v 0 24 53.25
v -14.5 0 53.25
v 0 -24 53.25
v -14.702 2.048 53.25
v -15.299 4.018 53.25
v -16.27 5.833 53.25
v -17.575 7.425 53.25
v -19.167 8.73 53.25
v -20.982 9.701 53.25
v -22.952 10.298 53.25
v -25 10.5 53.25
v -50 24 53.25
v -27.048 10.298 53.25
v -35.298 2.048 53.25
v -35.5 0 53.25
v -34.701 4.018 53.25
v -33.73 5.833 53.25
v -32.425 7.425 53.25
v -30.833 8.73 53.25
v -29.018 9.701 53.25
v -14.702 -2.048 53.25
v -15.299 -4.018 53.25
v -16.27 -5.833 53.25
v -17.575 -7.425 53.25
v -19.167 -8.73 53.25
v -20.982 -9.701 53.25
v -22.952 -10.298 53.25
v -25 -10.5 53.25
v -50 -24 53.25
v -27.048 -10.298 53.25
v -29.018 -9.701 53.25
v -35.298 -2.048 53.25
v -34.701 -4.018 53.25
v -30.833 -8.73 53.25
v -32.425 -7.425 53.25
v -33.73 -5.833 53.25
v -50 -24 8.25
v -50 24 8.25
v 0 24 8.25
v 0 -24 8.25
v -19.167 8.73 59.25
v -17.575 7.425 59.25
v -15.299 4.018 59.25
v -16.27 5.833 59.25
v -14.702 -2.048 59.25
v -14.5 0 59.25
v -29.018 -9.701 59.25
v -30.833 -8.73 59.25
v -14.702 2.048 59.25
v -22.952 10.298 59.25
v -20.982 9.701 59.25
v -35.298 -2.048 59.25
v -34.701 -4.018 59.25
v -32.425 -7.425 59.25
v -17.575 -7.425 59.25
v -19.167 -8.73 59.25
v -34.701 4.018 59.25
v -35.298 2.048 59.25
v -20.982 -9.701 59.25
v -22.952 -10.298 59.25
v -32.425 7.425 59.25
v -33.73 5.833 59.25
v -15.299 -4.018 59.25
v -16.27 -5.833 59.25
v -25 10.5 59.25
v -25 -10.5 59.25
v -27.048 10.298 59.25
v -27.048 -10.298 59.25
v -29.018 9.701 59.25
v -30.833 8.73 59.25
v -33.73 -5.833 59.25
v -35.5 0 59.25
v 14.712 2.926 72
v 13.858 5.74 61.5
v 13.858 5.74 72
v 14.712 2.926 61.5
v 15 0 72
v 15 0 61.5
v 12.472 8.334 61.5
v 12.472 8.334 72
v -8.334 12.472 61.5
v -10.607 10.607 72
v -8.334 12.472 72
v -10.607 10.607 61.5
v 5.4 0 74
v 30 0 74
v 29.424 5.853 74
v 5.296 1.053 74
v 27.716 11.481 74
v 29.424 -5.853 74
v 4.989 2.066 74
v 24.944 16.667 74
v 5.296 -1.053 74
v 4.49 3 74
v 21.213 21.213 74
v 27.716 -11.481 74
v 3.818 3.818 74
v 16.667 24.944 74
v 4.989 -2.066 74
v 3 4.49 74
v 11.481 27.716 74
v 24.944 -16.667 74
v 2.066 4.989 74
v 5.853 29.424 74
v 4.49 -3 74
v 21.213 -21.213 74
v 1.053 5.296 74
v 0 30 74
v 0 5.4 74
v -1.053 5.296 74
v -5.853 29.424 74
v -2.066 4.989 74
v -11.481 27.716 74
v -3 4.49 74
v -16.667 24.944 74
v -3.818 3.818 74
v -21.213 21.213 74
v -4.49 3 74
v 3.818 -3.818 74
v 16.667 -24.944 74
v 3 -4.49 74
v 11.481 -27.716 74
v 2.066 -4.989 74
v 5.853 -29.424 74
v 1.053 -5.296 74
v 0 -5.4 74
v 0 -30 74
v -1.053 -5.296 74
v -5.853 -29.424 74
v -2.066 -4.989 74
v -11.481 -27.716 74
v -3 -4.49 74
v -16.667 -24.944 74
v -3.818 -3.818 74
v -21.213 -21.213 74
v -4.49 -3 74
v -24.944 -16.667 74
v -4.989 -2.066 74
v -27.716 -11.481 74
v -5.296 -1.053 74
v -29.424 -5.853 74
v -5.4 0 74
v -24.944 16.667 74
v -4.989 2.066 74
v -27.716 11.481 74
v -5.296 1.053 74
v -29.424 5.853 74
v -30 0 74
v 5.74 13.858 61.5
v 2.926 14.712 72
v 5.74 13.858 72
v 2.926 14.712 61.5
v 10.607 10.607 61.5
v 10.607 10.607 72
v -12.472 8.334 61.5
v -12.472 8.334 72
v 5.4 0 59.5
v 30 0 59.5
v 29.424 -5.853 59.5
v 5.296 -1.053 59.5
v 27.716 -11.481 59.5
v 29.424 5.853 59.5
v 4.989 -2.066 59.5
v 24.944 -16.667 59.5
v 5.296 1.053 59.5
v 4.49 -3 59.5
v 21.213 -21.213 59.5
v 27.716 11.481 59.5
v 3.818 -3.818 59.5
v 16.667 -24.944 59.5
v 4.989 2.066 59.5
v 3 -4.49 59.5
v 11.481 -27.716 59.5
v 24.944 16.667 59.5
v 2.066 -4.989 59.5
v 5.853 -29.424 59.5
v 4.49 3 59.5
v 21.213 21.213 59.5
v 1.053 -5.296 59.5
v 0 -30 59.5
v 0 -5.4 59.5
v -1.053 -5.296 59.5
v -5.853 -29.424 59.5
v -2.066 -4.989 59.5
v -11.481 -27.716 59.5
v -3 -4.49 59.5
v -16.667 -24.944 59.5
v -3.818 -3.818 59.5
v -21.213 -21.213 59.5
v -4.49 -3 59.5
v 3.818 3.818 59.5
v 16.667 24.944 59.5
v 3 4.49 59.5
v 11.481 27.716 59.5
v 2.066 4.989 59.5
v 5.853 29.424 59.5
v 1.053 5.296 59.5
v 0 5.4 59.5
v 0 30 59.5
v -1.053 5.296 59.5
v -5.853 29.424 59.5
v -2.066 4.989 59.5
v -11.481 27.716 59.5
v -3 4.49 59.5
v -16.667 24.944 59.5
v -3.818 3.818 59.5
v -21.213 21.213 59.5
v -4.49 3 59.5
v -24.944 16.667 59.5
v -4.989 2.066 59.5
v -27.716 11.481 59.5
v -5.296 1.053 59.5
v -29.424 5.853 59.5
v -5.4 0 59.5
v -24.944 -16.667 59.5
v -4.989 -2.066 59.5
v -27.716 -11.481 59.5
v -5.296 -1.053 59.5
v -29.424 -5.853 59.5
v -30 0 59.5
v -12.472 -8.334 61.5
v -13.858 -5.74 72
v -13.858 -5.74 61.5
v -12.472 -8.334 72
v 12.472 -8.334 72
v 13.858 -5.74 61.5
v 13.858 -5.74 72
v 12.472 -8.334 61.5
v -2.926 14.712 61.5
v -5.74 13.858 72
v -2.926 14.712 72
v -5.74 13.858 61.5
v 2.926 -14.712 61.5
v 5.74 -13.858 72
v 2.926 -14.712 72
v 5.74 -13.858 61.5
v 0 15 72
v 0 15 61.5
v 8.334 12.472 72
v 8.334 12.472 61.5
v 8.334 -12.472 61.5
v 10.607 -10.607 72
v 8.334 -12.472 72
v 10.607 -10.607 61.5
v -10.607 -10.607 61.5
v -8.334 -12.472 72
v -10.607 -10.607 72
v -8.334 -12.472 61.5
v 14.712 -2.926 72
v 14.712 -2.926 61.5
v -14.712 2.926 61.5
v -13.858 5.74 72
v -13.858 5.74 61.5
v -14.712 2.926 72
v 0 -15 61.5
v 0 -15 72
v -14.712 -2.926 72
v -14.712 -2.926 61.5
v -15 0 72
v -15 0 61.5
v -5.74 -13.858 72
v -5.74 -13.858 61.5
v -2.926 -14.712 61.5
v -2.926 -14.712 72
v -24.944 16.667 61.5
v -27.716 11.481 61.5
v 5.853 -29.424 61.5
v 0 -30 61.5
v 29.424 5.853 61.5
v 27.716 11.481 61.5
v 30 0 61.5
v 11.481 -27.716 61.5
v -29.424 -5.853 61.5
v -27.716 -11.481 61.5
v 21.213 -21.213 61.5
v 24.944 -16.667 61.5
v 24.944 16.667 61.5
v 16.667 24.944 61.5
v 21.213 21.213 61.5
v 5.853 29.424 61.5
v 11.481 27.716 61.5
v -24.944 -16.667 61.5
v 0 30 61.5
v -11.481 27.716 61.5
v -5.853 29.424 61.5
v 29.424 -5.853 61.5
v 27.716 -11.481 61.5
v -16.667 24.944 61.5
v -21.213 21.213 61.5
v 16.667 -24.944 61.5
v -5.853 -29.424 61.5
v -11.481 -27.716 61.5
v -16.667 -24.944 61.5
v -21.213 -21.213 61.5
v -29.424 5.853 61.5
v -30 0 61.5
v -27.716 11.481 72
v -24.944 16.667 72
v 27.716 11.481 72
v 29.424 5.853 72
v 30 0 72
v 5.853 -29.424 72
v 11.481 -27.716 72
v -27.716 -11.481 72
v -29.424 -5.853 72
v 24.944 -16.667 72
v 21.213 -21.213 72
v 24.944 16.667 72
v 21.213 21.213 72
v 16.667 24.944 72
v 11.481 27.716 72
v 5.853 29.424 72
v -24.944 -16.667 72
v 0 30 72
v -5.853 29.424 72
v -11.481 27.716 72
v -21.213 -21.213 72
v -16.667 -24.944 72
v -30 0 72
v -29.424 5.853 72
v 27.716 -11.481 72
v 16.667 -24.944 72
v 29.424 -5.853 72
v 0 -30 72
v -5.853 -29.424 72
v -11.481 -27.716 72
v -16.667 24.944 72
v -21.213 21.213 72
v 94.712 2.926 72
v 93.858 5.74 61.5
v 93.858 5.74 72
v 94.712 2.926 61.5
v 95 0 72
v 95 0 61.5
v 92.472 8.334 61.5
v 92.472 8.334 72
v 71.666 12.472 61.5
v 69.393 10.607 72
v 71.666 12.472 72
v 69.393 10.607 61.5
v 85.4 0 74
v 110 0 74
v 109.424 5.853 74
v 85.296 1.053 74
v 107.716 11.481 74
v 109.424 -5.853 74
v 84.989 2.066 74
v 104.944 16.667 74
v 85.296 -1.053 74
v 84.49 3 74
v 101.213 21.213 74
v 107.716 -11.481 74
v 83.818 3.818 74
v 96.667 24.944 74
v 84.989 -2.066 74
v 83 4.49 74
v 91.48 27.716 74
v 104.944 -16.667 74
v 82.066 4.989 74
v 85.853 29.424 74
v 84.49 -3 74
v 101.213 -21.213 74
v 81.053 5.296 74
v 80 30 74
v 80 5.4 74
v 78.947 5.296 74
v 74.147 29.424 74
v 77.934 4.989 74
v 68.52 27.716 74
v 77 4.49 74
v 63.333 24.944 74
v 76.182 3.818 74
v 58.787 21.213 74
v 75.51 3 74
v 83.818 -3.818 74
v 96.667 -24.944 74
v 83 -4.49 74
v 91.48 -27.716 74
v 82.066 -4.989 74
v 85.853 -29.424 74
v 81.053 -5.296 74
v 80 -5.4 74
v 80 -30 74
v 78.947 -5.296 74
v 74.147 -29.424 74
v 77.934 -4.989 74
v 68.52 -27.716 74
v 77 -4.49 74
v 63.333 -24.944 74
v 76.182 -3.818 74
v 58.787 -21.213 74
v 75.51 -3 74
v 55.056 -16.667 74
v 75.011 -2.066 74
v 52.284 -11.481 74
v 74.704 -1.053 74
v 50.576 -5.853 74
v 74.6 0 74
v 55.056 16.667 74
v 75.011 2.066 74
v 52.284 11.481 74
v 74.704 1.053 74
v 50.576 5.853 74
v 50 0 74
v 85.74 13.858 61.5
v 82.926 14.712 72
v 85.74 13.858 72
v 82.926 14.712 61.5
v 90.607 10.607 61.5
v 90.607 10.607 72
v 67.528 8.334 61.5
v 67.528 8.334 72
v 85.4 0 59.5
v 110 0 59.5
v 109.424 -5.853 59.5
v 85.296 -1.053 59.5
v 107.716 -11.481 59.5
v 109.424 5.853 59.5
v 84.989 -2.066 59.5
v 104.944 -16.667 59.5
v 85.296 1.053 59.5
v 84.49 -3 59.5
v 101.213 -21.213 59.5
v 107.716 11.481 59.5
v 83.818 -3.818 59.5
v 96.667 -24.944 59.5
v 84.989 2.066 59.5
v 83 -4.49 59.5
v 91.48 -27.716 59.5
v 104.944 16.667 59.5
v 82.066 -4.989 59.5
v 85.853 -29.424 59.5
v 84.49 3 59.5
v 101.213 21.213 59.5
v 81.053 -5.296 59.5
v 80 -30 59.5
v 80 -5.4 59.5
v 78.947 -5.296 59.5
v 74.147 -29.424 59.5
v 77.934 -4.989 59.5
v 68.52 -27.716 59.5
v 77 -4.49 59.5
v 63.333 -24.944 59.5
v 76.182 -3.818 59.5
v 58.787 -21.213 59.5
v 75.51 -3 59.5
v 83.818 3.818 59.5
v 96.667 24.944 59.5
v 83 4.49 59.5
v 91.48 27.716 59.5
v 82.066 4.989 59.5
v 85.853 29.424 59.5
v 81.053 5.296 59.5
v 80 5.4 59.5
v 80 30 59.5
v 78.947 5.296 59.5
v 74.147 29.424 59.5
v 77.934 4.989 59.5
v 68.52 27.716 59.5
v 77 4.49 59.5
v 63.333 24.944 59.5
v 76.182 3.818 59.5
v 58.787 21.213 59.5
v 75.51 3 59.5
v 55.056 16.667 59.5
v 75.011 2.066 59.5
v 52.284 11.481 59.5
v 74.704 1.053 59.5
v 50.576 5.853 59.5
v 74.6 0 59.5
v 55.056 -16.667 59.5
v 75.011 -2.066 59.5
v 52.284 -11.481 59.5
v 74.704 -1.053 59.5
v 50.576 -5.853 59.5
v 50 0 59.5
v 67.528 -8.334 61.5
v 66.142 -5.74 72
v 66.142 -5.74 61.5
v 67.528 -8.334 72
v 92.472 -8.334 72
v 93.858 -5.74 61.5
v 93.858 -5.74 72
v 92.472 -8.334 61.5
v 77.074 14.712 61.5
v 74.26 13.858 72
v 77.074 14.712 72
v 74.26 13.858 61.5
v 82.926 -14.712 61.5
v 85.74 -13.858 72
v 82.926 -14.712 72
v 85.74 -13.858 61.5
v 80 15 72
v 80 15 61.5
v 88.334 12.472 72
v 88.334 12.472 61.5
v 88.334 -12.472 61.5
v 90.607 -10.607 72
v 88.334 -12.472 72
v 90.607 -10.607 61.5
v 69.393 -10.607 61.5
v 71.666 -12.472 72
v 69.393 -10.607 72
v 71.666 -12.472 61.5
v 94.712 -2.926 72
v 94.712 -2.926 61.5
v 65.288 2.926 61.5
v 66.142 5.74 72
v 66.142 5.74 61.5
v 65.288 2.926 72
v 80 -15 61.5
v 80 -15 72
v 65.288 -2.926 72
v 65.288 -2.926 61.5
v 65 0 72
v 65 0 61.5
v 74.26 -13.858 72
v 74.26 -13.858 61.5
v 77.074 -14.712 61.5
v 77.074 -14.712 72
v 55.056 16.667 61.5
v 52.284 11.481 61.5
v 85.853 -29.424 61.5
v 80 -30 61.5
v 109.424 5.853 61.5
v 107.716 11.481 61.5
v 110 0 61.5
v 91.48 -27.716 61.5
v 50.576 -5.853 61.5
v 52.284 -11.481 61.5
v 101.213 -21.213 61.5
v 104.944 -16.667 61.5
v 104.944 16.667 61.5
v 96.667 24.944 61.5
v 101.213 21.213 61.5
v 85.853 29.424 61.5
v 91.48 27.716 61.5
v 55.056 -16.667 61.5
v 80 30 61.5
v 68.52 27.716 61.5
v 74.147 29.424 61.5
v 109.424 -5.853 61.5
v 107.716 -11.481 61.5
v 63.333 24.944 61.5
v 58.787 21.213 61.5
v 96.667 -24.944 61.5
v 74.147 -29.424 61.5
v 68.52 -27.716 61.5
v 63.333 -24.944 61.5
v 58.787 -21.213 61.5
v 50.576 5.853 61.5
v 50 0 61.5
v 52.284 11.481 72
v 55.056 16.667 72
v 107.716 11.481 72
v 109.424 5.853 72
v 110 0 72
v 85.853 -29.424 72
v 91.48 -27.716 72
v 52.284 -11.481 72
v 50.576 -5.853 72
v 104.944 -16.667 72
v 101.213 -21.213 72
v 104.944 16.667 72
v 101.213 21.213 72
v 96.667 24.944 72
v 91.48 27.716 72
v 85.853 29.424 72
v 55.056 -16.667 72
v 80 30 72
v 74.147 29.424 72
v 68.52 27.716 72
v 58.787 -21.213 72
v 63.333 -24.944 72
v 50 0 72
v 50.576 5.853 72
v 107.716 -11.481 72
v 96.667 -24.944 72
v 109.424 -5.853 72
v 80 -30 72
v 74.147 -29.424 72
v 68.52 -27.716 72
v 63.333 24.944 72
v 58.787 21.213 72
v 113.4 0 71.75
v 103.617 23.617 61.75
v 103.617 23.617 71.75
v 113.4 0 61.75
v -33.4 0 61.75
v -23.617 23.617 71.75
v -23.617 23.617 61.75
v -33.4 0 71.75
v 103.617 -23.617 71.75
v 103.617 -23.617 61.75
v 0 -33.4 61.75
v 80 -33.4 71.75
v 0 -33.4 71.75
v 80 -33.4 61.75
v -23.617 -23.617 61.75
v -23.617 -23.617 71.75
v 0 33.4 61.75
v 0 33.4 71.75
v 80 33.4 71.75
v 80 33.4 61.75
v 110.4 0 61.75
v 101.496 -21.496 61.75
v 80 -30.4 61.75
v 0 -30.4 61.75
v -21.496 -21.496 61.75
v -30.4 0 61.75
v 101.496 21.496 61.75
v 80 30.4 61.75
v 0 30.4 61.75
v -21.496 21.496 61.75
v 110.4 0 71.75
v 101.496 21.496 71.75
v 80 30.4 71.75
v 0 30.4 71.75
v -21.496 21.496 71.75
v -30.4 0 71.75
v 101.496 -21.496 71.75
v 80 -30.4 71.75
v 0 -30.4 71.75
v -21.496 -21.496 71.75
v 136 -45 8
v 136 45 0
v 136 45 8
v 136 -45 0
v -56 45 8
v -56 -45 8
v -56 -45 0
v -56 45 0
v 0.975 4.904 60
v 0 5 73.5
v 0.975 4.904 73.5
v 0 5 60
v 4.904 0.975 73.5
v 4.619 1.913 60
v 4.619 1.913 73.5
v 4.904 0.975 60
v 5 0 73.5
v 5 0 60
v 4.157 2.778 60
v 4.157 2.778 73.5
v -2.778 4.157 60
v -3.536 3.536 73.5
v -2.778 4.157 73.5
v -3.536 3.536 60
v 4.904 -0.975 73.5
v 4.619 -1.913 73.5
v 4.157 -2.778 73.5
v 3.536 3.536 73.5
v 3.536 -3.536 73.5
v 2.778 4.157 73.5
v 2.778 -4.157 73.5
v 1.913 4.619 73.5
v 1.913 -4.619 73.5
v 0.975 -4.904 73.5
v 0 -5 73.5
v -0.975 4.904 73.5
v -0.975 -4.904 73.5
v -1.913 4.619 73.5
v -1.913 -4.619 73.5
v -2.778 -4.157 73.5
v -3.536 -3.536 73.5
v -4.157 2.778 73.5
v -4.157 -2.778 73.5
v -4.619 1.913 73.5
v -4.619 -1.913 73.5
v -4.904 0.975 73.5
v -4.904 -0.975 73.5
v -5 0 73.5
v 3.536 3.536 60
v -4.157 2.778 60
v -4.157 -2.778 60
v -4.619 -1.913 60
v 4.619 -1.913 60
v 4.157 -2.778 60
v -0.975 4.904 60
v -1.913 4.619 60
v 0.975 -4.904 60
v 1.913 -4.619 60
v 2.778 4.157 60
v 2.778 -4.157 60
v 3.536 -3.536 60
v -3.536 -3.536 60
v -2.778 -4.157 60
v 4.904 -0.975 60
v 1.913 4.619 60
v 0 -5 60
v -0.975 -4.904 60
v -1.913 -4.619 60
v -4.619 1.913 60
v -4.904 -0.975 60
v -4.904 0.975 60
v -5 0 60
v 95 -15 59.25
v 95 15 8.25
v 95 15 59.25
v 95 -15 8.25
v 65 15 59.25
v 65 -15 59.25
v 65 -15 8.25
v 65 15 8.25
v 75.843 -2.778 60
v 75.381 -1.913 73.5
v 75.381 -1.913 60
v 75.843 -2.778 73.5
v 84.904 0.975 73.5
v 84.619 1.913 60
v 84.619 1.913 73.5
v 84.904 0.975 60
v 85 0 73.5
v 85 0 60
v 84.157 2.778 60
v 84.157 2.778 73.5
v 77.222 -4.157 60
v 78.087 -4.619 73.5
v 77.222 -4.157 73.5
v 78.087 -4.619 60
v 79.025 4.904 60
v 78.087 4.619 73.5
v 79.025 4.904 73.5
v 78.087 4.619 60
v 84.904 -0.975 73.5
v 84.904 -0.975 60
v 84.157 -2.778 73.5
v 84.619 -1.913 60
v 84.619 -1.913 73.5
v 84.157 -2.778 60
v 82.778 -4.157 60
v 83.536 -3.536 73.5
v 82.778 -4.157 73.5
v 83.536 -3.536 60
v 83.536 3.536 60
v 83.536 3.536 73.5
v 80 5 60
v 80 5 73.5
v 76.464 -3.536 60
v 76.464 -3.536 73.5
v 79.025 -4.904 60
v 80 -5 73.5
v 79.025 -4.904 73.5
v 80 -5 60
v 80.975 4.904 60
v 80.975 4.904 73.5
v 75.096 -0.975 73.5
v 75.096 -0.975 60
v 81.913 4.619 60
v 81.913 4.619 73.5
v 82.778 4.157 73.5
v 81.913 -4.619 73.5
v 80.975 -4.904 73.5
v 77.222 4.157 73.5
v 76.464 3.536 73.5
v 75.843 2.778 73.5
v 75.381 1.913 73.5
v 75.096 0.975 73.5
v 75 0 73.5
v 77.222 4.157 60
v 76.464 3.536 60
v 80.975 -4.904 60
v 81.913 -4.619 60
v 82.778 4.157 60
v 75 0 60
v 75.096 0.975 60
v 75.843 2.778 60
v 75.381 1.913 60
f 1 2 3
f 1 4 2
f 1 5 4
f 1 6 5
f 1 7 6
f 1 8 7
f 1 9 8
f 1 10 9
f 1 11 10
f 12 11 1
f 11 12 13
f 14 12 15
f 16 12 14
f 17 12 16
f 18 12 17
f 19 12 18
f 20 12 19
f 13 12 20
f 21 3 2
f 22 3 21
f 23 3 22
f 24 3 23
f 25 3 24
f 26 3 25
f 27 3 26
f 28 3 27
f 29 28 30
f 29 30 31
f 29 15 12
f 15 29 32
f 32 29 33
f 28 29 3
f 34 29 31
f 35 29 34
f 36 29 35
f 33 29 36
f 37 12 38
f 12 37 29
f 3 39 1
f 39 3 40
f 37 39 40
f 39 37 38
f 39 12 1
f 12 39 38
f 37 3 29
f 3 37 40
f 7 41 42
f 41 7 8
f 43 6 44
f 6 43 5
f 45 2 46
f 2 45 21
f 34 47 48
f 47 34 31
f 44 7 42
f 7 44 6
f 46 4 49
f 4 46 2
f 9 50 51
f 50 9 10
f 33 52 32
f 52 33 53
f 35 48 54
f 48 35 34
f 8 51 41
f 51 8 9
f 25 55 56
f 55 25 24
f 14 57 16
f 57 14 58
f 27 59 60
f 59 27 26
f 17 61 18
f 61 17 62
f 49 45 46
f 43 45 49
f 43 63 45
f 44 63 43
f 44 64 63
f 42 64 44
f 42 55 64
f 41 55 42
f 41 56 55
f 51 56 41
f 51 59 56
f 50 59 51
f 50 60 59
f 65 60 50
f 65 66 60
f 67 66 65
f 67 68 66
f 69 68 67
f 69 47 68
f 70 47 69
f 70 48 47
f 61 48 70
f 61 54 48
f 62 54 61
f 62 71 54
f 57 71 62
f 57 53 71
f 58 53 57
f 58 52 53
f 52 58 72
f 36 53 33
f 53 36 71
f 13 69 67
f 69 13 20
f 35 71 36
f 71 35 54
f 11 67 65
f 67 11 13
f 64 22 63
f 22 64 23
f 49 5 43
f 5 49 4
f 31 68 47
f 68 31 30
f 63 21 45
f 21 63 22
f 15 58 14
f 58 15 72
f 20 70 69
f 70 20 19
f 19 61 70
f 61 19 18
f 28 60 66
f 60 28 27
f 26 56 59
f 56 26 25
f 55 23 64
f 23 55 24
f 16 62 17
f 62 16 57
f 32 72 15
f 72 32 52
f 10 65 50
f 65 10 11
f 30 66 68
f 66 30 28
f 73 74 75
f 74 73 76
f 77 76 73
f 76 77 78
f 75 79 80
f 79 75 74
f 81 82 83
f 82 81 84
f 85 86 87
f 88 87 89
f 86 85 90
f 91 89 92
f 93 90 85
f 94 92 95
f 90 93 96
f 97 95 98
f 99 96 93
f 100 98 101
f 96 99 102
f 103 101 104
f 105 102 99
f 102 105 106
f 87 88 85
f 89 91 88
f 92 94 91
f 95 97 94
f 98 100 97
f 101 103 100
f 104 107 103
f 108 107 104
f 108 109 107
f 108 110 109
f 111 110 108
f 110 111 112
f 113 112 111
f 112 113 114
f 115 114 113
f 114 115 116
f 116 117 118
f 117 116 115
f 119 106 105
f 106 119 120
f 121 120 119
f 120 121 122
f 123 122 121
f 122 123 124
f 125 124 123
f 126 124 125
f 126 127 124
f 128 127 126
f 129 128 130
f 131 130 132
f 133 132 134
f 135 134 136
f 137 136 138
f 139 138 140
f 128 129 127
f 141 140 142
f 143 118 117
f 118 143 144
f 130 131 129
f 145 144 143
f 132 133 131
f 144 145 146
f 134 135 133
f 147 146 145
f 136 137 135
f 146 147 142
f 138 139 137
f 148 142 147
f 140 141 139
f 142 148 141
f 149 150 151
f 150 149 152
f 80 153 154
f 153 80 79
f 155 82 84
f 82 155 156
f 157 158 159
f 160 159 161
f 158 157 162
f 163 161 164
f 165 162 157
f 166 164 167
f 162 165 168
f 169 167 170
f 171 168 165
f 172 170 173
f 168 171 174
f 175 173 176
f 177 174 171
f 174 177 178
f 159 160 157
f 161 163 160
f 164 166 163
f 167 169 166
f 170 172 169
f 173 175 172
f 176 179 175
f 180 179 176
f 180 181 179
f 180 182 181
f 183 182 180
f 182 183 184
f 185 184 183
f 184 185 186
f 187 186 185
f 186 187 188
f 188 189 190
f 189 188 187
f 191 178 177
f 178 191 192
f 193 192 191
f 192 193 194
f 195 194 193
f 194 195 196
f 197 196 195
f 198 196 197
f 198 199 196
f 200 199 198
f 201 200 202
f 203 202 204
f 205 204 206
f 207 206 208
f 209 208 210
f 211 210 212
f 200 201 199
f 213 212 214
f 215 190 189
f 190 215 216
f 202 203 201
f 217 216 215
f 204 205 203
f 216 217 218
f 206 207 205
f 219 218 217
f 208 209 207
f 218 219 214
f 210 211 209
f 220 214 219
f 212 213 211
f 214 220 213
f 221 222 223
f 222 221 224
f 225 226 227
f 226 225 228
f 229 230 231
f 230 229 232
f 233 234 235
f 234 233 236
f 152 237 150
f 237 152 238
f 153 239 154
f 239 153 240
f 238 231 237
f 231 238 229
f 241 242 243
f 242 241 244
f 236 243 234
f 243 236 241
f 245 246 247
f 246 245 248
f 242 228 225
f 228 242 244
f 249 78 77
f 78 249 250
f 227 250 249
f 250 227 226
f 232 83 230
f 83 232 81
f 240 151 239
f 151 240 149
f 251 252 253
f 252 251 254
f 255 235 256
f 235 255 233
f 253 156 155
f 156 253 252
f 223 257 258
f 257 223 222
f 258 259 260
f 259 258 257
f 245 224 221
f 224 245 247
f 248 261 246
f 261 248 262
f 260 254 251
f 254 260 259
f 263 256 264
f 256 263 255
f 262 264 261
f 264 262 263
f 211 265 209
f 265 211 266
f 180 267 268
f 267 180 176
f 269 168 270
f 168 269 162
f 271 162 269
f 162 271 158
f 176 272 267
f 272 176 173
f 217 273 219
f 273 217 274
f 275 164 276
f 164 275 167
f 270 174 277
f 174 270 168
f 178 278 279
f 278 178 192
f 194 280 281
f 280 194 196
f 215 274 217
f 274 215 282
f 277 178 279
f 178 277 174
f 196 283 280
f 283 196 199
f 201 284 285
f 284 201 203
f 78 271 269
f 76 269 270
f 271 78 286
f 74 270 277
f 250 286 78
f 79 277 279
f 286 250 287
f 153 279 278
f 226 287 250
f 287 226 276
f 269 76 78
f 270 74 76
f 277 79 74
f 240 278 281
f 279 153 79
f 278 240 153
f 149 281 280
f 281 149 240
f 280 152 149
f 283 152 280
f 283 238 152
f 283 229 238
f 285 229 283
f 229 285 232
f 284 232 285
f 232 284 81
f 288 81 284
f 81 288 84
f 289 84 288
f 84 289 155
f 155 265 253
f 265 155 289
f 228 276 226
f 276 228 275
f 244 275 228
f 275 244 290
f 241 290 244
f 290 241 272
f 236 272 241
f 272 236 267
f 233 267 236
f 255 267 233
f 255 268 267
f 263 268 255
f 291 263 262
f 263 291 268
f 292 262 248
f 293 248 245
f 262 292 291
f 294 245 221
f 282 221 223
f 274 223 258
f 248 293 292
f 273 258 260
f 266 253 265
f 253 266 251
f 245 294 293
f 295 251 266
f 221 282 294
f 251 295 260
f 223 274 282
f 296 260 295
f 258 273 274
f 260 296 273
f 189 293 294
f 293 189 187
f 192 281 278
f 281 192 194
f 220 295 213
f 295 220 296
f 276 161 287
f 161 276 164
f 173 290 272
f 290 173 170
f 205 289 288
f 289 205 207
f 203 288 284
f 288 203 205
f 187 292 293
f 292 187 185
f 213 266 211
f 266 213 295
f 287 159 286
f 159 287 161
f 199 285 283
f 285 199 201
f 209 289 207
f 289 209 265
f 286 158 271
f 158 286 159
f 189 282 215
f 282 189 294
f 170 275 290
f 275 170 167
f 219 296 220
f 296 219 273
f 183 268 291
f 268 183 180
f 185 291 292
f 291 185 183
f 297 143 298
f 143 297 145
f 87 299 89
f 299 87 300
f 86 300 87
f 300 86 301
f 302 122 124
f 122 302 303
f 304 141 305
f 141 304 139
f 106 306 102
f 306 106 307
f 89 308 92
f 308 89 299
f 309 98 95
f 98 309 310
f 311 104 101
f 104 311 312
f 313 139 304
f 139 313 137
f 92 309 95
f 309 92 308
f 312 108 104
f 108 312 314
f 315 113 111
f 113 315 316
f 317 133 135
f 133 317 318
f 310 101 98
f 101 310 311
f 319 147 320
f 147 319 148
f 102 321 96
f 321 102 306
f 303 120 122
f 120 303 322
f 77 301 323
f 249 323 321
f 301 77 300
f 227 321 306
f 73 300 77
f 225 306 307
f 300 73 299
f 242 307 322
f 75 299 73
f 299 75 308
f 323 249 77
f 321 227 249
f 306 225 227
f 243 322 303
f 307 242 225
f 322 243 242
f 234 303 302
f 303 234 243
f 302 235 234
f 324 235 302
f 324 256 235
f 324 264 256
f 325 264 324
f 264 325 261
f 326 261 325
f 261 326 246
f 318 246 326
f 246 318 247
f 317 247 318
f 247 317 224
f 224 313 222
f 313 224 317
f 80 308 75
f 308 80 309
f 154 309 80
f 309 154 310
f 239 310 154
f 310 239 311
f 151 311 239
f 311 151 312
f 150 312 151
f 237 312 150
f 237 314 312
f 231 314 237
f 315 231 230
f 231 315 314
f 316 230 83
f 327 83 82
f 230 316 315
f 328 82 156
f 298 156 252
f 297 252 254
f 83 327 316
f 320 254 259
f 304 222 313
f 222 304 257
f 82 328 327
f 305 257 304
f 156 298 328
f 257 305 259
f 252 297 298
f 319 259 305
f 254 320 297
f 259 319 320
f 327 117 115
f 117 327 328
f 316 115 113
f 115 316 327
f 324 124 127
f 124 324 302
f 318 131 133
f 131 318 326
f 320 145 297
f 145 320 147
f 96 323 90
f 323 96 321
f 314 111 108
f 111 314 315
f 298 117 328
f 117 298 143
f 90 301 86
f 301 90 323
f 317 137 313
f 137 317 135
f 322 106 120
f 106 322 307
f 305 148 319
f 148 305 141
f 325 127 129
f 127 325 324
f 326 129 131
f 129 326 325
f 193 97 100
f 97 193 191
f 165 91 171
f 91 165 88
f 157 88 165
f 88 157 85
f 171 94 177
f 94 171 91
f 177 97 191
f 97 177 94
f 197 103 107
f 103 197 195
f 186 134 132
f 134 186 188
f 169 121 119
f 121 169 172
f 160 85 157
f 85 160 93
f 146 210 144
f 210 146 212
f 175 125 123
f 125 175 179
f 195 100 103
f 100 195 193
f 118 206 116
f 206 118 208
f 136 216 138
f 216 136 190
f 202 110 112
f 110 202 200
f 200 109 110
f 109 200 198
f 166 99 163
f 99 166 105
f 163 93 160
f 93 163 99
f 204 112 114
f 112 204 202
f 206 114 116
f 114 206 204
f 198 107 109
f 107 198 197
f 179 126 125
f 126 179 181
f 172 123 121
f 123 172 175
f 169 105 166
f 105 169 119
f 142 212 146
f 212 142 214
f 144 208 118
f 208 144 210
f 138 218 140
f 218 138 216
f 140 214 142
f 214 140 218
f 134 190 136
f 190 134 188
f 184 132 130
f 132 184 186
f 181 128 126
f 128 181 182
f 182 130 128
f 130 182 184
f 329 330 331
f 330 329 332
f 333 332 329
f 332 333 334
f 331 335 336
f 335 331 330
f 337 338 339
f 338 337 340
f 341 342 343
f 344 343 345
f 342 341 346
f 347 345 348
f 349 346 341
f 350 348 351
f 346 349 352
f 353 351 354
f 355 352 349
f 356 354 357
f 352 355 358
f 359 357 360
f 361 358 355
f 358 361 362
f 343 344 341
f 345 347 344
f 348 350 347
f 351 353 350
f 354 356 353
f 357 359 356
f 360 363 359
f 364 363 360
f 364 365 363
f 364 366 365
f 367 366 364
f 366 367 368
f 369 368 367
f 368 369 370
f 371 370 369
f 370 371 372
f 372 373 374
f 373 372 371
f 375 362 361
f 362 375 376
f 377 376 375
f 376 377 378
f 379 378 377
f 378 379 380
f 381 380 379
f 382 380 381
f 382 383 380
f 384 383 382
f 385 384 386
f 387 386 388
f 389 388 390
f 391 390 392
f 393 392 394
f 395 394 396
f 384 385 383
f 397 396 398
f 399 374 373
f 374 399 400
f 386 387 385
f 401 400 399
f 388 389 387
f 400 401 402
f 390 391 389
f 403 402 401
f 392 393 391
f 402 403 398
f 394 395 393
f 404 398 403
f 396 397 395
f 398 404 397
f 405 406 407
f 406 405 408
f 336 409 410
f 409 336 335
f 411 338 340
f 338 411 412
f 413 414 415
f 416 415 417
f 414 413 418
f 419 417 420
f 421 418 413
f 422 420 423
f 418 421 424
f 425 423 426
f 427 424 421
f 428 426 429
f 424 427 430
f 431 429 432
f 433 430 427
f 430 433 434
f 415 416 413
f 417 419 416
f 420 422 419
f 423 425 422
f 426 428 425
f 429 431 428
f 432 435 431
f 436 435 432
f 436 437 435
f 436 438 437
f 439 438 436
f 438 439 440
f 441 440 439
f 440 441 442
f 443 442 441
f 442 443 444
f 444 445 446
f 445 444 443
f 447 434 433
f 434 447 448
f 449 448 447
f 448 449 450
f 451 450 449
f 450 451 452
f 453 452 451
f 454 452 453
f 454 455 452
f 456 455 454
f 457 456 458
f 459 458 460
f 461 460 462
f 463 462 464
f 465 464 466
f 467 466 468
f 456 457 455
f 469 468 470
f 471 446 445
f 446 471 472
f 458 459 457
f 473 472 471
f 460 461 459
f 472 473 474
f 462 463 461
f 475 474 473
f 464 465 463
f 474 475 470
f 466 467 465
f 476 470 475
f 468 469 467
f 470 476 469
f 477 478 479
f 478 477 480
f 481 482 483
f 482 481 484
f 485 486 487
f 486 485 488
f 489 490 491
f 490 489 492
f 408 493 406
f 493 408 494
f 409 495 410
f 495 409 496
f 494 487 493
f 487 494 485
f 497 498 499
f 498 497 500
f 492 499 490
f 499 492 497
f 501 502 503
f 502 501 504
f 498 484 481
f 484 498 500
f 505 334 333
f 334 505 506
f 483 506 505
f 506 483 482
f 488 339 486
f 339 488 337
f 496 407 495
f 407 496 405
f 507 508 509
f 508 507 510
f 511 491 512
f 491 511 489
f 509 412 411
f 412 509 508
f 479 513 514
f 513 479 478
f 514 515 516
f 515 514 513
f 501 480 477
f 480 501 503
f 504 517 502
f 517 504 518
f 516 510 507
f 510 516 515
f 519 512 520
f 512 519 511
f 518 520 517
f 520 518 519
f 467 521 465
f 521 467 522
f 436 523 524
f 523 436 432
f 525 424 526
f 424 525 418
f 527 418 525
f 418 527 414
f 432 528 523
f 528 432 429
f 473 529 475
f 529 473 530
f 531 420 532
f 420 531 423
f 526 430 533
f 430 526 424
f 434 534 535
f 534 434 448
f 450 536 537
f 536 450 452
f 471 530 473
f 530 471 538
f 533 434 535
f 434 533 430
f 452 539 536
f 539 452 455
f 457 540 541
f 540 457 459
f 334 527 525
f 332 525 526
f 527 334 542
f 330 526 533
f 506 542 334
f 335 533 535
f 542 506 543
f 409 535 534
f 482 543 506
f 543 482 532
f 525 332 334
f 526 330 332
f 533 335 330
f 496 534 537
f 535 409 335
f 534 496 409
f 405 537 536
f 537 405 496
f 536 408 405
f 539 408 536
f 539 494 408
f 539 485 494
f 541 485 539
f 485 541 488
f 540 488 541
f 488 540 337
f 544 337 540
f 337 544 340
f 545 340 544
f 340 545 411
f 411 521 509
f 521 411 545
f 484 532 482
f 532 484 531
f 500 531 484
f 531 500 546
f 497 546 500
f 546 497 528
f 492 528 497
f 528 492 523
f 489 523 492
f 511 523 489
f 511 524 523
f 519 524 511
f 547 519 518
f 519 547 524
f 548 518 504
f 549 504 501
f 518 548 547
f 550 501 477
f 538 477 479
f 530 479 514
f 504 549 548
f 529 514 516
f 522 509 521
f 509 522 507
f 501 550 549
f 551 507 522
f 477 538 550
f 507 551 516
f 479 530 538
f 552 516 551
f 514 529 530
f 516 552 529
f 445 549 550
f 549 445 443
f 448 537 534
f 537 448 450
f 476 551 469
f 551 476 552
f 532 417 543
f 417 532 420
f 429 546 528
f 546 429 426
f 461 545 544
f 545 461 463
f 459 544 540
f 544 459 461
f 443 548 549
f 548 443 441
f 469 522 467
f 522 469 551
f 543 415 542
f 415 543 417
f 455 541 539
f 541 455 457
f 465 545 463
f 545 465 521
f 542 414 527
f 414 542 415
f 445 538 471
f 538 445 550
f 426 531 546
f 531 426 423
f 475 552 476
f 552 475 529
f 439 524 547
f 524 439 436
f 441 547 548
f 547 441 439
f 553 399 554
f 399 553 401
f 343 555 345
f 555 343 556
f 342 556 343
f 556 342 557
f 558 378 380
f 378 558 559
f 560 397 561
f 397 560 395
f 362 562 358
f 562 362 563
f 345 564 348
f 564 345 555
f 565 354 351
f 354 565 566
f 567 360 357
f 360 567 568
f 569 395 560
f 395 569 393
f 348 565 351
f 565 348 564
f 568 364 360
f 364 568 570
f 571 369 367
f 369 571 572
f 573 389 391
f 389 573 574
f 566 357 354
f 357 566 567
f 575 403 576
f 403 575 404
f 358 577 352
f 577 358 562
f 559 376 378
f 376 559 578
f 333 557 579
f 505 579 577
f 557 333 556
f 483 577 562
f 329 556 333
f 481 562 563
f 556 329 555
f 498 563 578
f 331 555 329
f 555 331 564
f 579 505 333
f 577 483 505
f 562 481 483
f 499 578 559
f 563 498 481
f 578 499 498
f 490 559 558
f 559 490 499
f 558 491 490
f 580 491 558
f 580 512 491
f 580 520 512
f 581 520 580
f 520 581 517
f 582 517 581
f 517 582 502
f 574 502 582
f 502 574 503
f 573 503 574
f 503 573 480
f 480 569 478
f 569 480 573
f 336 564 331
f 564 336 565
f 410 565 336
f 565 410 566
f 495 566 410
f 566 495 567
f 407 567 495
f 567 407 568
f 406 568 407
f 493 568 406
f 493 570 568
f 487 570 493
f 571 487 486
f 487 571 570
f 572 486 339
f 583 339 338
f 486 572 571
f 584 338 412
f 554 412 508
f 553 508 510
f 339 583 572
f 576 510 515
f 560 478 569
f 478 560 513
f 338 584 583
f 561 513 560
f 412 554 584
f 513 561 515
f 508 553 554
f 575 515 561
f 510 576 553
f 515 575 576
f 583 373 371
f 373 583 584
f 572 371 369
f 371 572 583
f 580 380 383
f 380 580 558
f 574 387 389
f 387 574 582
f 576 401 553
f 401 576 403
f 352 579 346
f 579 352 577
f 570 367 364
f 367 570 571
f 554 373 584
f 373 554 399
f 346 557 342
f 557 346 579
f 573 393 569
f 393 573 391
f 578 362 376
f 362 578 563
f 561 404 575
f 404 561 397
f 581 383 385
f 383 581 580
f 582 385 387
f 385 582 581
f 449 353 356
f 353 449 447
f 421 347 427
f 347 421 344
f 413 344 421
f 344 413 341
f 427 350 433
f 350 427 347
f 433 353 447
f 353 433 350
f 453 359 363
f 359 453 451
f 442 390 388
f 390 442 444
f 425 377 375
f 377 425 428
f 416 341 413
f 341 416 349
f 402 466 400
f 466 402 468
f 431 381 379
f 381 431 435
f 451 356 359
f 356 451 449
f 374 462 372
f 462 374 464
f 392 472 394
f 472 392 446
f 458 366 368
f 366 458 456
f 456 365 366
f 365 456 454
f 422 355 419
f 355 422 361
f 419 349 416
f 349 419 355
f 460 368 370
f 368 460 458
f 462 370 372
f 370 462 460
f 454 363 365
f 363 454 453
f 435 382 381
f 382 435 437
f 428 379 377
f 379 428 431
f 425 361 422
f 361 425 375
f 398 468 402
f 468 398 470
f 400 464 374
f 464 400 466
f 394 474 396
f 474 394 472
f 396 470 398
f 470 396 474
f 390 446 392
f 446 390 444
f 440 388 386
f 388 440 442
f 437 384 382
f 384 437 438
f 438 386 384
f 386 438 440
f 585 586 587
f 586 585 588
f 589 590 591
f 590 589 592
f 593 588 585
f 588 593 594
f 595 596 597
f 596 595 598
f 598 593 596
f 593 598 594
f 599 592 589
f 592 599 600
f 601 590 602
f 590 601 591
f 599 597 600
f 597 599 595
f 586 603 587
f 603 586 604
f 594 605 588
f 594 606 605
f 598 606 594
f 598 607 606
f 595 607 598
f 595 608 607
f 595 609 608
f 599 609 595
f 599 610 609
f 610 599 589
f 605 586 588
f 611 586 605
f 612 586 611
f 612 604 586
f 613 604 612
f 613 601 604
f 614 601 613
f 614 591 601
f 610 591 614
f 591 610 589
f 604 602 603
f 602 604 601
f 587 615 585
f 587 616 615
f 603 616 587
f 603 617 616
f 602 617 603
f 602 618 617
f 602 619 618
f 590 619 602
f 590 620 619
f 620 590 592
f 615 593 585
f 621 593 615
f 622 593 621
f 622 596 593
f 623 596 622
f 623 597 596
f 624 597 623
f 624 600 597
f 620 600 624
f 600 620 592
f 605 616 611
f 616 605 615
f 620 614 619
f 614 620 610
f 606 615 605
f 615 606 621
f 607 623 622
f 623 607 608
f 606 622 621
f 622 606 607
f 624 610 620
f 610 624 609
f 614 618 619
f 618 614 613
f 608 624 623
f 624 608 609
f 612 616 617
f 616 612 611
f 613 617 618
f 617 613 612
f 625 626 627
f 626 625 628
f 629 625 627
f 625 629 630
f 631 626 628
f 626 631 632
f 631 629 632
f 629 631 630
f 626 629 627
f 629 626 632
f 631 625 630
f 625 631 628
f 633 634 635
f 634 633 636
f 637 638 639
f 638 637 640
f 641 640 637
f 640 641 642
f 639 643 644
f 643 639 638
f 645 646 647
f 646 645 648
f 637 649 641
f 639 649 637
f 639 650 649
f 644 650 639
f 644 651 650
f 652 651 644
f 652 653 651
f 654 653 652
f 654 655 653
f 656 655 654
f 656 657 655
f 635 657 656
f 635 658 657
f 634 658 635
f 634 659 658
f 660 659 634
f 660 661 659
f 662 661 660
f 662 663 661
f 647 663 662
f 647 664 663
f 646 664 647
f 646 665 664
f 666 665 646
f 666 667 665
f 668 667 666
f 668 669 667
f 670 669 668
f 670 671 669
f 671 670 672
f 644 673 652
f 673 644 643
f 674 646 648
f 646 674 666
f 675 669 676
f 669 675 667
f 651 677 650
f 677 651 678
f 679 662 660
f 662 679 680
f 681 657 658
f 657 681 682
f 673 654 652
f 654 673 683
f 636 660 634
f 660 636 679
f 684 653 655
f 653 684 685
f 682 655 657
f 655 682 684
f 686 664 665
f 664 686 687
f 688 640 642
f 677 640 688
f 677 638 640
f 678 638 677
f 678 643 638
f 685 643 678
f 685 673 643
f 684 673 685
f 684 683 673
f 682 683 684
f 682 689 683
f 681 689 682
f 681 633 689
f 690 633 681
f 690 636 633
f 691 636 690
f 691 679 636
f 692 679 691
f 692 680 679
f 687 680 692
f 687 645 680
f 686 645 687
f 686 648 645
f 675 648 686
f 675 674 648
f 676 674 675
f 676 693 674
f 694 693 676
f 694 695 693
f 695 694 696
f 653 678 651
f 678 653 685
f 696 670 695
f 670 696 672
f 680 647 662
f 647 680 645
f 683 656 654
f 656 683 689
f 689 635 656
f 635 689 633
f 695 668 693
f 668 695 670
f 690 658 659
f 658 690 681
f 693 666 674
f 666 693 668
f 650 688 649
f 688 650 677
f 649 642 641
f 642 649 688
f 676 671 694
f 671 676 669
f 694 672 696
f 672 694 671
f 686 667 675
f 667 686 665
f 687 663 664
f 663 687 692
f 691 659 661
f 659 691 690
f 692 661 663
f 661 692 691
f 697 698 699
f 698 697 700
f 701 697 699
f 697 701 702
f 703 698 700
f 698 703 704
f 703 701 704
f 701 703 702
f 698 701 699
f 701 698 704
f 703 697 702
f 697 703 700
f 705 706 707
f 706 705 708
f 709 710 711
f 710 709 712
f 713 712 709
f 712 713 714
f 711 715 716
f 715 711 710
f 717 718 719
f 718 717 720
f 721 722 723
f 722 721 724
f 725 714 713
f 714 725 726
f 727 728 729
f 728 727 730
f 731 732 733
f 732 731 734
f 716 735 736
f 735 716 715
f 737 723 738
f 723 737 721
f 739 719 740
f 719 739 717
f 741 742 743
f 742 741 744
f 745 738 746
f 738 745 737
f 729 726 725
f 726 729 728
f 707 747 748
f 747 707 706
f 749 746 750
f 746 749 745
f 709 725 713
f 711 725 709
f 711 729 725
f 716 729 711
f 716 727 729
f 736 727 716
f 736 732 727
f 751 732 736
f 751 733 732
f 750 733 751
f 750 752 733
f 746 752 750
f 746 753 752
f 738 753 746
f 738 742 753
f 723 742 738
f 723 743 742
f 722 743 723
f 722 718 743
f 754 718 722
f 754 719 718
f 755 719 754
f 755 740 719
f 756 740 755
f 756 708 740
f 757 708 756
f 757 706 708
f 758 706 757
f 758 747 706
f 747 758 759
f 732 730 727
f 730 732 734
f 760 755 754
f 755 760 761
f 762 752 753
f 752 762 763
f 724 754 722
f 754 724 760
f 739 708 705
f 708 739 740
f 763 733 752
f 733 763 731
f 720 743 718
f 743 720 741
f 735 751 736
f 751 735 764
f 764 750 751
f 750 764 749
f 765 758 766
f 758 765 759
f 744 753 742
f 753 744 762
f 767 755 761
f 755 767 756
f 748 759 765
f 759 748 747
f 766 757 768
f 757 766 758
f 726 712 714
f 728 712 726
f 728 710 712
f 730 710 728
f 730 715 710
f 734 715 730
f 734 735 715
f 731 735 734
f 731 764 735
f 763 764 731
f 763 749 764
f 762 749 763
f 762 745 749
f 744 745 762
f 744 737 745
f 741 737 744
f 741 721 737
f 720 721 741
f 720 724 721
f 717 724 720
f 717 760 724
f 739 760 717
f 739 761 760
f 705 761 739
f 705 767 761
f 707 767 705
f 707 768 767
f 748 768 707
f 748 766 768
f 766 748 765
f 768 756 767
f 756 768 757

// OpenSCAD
$fn = 32;

// ------------------------------------------------------------------------
// Motor belt drive: span 80 mm, pulleys d60, belt 10 mm wide
// Every part is its own module, assembly() places every instance.
// ------------------------------------------------------------------------

// --- part 1 ---
module base_plate() {
  difference() {
    translate([-96, -45, 0]) cube([192, 90, 8]);
  }
}

// --- part 2 ---
module motor() {
  union() {
    translate([-22.5, -24, 0]) cube([45, 48, 50]);
    translate([25.5, 0, 25]) rotate([0, 90, 0]) cylinder(h = 6, d = 21, center = true);
  }
}

// --- part 3 ---
module drive_shaft() {
  translate([0, 0, -6.75]) cylinder(h = 13.5, d = 10);
}

// --- part 4 ---
module pulley_drive() {
  difference() {
    union() {
      cylinder(h = 14.5, d = 30);
      cylinder(h = 2, d = 60);
      translate([0, 0, 12.5]) cylinder(h = 2, d = 60);
    }
    translate([0, 0, -1]) cylinder(h = 16.5, d = 10.8);
  }
}

// --- part 5 ---
module idler_post() {
  translate([-15, -15, 0]) cube([30, 30, 51]);
}

// --- part 6 ---
module driven_shaft() {
  translate([0, 0, -6.75]) cylinder(h = 13.5, d = 10);
}

// --- part 7 ---
module pulley_driven() {
  difference() {
    union() {
      cylinder(h = 14.5, d = 30);
      cylinder(h = 2, d = 60);
      translate([0, 0, 12.5]) cylinder(h = 2, d = 60);
    }
    translate([0, 0, -1]) cylinder(h = 16.5, d = 10.8);
  }
}

// --- part 8 ---
module drive_belt() {
  difference() {
    linear_extrude(height = 10) polygon(points = concat([for (a = [90 : 45 : 270]) [33.4 * cos(a), 33.4 * sin(a)]], [for (a = [270 : 45 : 450]) [80 + 33.4 * cos(a), 33.4 * sin(a)]]));
    translate([0, 0, -1]) linear_extrude(height = 12) polygon(points = concat([for (a = [90 : 45 : 270]) [30.4 * cos(a), 30.4 * sin(a)]], [for (a = [270 : 45 : 450]) [80 + 30.4 * cos(a), 30.4 * sin(a)]]));
  }
}

// --- assembly ---
module assembly() {
  color([0.80, 0.24, 0.20]) translate([40, 0, 0]) rotate([0, 0, 0]) base_plate();
  color([0.20, 0.45, 0.75]) translate([0, 0, 30.75]) rotate([0, 270, 0]) motor();
  color([0.25, 0.62, 0.32]) translate([0, 0, 66.75]) rotate([0, 0, 0]) drive_shaft();
  color([0.92, 0.70, 0.18]) translate([0, 0, 59.5]) rotate([0, 0, 0]) pulley_drive();
  color([0.58, 0.35, 0.70]) translate([80, 0, 8.25]) rotate([0, 0, 0]) idler_post();
  color([0.16, 0.66, 0.66]) translate([80, 0, 66.75]) rotate([0, 0, 0]) driven_shaft();
  color([0.85, 0.48, 0.18]) translate([80, 0, 59.5]) rotate([0, 0, 0]) pulley_driven();
  color([0.55, 0.60, 0.65]) translate([0, 0, 61.75]) rotate([0, 0, 0]) drive_belt();
}

assembly();
